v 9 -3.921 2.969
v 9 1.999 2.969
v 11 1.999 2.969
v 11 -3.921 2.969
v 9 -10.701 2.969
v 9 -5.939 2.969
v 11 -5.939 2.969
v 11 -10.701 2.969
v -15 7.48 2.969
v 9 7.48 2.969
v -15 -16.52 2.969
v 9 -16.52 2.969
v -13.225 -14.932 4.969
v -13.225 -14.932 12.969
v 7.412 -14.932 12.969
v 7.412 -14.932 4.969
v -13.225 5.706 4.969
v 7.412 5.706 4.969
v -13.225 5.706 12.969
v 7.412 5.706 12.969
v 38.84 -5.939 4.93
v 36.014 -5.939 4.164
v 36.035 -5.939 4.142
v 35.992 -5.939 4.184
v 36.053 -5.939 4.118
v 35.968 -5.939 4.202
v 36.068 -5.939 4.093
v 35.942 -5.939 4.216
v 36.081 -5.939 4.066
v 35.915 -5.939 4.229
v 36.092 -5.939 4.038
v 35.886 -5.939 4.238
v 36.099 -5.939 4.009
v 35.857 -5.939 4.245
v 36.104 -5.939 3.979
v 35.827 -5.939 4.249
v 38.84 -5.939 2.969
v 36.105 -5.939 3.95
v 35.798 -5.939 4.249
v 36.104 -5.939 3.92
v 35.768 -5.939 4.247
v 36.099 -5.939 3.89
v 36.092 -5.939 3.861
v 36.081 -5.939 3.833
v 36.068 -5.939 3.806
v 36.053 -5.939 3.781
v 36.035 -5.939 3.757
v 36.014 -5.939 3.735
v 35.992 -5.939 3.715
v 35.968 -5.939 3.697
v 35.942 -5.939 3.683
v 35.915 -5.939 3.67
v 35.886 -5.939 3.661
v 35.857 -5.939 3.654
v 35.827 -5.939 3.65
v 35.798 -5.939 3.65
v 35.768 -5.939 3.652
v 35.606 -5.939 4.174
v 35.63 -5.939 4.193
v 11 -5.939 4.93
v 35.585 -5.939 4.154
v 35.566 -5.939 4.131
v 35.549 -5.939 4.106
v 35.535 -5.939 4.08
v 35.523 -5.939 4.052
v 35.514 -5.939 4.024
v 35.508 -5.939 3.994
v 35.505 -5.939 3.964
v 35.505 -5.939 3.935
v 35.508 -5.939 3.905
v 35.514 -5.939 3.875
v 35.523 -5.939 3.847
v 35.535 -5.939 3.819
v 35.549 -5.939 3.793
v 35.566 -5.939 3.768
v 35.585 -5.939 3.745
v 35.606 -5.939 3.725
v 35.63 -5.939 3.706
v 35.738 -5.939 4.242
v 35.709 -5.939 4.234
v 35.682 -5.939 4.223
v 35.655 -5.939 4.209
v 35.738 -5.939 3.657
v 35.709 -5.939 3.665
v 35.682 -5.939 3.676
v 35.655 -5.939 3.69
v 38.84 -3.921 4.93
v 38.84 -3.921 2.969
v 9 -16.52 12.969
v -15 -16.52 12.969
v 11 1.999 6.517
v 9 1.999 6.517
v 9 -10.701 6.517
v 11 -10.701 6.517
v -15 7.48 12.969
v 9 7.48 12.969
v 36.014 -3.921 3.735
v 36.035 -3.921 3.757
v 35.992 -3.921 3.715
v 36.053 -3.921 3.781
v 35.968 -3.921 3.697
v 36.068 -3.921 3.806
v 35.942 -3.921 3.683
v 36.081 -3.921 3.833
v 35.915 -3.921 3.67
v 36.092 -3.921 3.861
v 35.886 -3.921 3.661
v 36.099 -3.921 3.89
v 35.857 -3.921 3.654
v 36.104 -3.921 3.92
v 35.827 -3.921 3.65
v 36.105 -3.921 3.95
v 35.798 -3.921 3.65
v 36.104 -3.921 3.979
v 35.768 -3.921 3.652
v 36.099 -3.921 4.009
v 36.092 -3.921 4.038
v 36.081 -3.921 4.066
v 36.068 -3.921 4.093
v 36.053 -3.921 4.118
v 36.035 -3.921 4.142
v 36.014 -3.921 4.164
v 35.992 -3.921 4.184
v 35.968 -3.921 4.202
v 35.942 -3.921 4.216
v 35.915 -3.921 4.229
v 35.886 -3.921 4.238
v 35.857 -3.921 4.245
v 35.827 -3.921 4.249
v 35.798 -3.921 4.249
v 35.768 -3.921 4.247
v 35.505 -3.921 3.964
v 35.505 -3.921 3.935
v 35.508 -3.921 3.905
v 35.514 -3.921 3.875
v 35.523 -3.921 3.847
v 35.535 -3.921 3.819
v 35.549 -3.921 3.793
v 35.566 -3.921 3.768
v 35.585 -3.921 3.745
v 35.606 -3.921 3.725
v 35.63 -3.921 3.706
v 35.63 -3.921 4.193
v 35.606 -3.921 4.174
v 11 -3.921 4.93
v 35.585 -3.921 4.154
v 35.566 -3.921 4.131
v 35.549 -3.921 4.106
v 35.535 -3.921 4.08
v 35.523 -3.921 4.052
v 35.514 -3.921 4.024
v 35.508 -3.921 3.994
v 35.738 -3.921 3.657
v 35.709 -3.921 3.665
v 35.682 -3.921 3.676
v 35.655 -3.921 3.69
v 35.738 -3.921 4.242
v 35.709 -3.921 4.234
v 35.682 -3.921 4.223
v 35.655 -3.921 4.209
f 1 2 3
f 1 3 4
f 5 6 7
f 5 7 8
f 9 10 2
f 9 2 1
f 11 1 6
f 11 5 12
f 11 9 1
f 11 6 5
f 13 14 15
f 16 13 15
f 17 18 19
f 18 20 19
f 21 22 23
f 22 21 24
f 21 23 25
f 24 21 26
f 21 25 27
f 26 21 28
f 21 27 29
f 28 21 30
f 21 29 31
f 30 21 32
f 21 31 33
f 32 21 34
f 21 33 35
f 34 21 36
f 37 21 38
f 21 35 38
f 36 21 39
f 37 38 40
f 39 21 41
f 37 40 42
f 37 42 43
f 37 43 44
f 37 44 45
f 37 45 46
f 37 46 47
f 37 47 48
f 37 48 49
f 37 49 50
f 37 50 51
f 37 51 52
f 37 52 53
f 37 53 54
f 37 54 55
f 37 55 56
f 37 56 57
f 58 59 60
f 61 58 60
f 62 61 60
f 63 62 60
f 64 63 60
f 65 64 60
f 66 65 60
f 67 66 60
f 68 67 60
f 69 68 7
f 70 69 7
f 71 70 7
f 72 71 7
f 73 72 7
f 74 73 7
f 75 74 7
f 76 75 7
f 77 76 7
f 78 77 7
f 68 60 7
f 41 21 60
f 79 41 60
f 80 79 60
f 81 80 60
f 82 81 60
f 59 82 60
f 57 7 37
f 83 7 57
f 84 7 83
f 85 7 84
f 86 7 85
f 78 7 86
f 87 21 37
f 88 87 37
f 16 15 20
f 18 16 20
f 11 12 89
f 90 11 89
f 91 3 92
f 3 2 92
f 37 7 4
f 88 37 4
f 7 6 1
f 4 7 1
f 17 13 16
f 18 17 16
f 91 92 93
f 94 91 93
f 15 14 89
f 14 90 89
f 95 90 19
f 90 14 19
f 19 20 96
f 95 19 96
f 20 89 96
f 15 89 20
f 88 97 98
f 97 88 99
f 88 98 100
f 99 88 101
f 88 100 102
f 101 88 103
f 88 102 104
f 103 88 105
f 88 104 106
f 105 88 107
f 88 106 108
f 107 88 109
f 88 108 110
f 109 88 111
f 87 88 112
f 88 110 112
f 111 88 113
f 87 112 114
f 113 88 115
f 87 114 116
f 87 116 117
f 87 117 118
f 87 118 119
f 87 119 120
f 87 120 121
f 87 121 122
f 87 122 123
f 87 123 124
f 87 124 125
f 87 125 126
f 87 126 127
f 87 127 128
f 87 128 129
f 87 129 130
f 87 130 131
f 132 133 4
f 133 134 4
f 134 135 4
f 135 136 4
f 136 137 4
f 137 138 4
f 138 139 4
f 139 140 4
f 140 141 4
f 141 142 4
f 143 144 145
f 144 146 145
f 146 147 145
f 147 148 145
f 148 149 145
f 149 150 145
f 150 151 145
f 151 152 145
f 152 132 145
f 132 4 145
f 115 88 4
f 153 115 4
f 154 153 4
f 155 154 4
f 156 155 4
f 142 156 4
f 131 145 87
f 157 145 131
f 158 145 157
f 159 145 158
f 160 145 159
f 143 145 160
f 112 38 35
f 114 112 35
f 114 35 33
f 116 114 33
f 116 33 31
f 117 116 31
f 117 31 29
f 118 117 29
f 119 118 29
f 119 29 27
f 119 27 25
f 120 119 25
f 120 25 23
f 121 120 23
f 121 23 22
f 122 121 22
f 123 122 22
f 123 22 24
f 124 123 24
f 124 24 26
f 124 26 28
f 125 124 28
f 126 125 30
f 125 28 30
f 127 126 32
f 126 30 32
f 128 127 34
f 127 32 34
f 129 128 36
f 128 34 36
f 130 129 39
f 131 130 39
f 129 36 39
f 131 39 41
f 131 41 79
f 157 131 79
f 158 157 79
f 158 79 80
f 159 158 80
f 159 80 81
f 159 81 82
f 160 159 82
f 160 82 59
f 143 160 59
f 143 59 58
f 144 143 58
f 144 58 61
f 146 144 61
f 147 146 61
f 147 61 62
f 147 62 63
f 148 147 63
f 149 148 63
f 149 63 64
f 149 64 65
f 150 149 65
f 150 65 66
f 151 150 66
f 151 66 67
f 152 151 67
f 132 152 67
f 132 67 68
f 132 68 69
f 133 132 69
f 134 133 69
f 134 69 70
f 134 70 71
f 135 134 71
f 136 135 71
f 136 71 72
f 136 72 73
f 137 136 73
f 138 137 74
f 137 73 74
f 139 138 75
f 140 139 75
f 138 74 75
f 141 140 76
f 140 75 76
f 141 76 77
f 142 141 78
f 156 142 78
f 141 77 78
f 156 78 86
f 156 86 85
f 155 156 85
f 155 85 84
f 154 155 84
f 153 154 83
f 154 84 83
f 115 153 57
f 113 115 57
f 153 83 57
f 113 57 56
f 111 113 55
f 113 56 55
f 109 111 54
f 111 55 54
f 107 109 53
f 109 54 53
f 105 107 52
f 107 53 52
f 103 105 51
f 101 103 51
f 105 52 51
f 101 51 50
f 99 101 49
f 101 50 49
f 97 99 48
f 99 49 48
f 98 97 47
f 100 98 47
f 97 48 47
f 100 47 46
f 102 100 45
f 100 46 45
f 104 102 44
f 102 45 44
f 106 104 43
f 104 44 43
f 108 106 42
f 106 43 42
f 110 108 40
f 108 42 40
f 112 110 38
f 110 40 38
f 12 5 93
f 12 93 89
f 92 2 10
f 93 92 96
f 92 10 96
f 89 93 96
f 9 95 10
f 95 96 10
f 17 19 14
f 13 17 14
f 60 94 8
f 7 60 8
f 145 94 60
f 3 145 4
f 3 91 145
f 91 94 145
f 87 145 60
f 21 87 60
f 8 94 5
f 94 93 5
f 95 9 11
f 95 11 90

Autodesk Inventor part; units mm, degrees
ref_plane "YZ Plane" through (0, 0, 0) normal (1, 0, 0) x (0, 1, 0)
ref_plane "XZ Plane" through (0, 0, 0) normal (0, 1, 0) x (-1, 0, 0)
ref_plane "XY Plane" through (0, 0, 0) normal (0, 0, 1) x (1, 0, 0)
sketch "Sketch5" plane through (0, 0, 0) normal (0, 0, 1) x (1, 0, 0)
  line L0 (-11.1597, 4.6835) -> (8.8403, 4.6835)
  line L1 (8.8403, 4.6835) -> (8.8403, -15.3165)
  line L2 (8.8403, -15.3165) -> (-11.1597, -15.3165)
  line L3 (-11.1597, -15.3165) -> (-11.1597, 4.6835)
  point P0 (0, 0)
  dimension "d13" = 20
  dimension "d14" = 20
extrude "Extrusion5" add sketch "Sketch5" along normal blind 8
sketch "Sketch6" plane through (0, 0, 8) normal (0, 0, 1) x (1, 0, 0)
  line L0 (-10.6667, 4.1905) -> (8.3333, 4.1905)
  line L1 (8.3333, 4.1905) -> (8.3333, -14.8095)
  line L2 (8.3333, -14.8095) -> (-10.6667, -14.8095)
  line L3 (-10.6667, -14.8095) -> (-10.6667, 4.1905)
  point P0 (0, 0)
  dimension "d17" = 19
  dimension "d18" = 19
extrude "Extrusion6" cut sketch "Sketch6" against normal blind 7
sketch "Sketch11" plane through (8.8403, -15.3165, 0) normal (1, 0, 0) x (0, 0, -1)
  line L0 (-4.9297, 9.3778) -> (-2.9693, 9.3778)
  line L1 (-2.9693, 9.3778) -> (-2.9693, 11.3958)
  line L2 (-2.9693, 11.3958) -> (-4.9297, 11.3958)
  line L3 (-4.9297, 11.3958) -> (-4.9297, 9.3778)
  point P0 (0, 15.3165)
extrude "Extrusion11" add sketch "Sketch11" along normal blind 30
sketch "Sketch12" plane through (8.8403, -5.9387, 2.9693) normal (0, -1, 0) x (1, 0, 0)
  circle A0 centre (26.9647, 0.9802) radius 0.3
  point P0 (-8.8403, -2.9693)
  dimension "d35" = 0.6
extrude "Extrusion12" cut sketch "Sketch12" against normal blind 30
sketch "Sketch13" plane through (0, 0, 0) normal (0, 0, -1) x (-1, 0, 0)
  line L0 (-9, 6.898) -> (15, 6.898)
  line L1 (15, 6.898) -> (15, -17.102)
  line L2 (15, -17.102) -> (-9, -17.102)
  line L3 (-9, -17.102) -> (-9, 6.898)
  point P0 (0, 0)
  dimension "d38" = 24
  dimension "d39" = 24
extrude "Extrusion13" cut sketch "Sketch13" against normal blind 10
sketch "Sketch14" plane through (9, -5.9387, 4.9297) normal (-1, 0, 0) x (0, 0, 1)
  line L0 (-1.9603, 0) -> (-1.9603, 2.018) projected
  line L1 (-1.9603, -10.5808) -> (8.0397, -10.5808)
  line L2 (8.0397, -10.5808) -> (8.0397, 13.4192)
  line L3 (8.0397, 13.4192) -> (-1.9603, 13.4192)
  line L4 (-1.9603, 13.4192) -> (-1.9603, -10.5808)
  point P0 (-4.9297, 5.9387)
  dimension "d42" = 10
  dimension "d43" = 24
extrude "Extrusion14" add sketch "Sketch14" along normal blind 24
sketch "Sketch15" plane through (9, -16.5195, 12.9693) normal (0, 0, 1) x (1, 0, 0)
  line L0 (-1.5875, 22.225) -> (-22.225, 22.225)
  line L1 (-22.225, 22.225) -> (-22.225, 1.5875)
  line L2 (-22.225, 1.5875) -> (-1.5875, 1.5875)
  line L3 (-1.5875, 1.5875) -> (-1.5875, 22.225)
  point P0 (-9, 16.5195)
extrude "Extrusion15" cut sketch "Sketch15" against normal blind 8
sketch "Sketch16" plane through (9, -5.9387, 4.9297) normal (1, 0, 0) x (0, 0, -1)
  line L0 (1.9603, 13.4192) -> (1.9603, -10.5808) projected
  line L1 (1.9603, 7.9375) -> (-1.5875, 7.9375)
  line L2 (-1.5875, 7.9375) -> (-1.5875, -4.7625)
  line L3 (-1.5875, -4.7625) -> (1.9603, -4.7625)
  line L4 (1.9603, -4.7625) -> (1.9603, 7.9375)
  point P0 (4.9297, 5.9387)
  point P1 (1.9603, -4.7625)
extrude "Extrusion16" add sketch "Sketch16" along normal blind 2
properties part number "pusher"
